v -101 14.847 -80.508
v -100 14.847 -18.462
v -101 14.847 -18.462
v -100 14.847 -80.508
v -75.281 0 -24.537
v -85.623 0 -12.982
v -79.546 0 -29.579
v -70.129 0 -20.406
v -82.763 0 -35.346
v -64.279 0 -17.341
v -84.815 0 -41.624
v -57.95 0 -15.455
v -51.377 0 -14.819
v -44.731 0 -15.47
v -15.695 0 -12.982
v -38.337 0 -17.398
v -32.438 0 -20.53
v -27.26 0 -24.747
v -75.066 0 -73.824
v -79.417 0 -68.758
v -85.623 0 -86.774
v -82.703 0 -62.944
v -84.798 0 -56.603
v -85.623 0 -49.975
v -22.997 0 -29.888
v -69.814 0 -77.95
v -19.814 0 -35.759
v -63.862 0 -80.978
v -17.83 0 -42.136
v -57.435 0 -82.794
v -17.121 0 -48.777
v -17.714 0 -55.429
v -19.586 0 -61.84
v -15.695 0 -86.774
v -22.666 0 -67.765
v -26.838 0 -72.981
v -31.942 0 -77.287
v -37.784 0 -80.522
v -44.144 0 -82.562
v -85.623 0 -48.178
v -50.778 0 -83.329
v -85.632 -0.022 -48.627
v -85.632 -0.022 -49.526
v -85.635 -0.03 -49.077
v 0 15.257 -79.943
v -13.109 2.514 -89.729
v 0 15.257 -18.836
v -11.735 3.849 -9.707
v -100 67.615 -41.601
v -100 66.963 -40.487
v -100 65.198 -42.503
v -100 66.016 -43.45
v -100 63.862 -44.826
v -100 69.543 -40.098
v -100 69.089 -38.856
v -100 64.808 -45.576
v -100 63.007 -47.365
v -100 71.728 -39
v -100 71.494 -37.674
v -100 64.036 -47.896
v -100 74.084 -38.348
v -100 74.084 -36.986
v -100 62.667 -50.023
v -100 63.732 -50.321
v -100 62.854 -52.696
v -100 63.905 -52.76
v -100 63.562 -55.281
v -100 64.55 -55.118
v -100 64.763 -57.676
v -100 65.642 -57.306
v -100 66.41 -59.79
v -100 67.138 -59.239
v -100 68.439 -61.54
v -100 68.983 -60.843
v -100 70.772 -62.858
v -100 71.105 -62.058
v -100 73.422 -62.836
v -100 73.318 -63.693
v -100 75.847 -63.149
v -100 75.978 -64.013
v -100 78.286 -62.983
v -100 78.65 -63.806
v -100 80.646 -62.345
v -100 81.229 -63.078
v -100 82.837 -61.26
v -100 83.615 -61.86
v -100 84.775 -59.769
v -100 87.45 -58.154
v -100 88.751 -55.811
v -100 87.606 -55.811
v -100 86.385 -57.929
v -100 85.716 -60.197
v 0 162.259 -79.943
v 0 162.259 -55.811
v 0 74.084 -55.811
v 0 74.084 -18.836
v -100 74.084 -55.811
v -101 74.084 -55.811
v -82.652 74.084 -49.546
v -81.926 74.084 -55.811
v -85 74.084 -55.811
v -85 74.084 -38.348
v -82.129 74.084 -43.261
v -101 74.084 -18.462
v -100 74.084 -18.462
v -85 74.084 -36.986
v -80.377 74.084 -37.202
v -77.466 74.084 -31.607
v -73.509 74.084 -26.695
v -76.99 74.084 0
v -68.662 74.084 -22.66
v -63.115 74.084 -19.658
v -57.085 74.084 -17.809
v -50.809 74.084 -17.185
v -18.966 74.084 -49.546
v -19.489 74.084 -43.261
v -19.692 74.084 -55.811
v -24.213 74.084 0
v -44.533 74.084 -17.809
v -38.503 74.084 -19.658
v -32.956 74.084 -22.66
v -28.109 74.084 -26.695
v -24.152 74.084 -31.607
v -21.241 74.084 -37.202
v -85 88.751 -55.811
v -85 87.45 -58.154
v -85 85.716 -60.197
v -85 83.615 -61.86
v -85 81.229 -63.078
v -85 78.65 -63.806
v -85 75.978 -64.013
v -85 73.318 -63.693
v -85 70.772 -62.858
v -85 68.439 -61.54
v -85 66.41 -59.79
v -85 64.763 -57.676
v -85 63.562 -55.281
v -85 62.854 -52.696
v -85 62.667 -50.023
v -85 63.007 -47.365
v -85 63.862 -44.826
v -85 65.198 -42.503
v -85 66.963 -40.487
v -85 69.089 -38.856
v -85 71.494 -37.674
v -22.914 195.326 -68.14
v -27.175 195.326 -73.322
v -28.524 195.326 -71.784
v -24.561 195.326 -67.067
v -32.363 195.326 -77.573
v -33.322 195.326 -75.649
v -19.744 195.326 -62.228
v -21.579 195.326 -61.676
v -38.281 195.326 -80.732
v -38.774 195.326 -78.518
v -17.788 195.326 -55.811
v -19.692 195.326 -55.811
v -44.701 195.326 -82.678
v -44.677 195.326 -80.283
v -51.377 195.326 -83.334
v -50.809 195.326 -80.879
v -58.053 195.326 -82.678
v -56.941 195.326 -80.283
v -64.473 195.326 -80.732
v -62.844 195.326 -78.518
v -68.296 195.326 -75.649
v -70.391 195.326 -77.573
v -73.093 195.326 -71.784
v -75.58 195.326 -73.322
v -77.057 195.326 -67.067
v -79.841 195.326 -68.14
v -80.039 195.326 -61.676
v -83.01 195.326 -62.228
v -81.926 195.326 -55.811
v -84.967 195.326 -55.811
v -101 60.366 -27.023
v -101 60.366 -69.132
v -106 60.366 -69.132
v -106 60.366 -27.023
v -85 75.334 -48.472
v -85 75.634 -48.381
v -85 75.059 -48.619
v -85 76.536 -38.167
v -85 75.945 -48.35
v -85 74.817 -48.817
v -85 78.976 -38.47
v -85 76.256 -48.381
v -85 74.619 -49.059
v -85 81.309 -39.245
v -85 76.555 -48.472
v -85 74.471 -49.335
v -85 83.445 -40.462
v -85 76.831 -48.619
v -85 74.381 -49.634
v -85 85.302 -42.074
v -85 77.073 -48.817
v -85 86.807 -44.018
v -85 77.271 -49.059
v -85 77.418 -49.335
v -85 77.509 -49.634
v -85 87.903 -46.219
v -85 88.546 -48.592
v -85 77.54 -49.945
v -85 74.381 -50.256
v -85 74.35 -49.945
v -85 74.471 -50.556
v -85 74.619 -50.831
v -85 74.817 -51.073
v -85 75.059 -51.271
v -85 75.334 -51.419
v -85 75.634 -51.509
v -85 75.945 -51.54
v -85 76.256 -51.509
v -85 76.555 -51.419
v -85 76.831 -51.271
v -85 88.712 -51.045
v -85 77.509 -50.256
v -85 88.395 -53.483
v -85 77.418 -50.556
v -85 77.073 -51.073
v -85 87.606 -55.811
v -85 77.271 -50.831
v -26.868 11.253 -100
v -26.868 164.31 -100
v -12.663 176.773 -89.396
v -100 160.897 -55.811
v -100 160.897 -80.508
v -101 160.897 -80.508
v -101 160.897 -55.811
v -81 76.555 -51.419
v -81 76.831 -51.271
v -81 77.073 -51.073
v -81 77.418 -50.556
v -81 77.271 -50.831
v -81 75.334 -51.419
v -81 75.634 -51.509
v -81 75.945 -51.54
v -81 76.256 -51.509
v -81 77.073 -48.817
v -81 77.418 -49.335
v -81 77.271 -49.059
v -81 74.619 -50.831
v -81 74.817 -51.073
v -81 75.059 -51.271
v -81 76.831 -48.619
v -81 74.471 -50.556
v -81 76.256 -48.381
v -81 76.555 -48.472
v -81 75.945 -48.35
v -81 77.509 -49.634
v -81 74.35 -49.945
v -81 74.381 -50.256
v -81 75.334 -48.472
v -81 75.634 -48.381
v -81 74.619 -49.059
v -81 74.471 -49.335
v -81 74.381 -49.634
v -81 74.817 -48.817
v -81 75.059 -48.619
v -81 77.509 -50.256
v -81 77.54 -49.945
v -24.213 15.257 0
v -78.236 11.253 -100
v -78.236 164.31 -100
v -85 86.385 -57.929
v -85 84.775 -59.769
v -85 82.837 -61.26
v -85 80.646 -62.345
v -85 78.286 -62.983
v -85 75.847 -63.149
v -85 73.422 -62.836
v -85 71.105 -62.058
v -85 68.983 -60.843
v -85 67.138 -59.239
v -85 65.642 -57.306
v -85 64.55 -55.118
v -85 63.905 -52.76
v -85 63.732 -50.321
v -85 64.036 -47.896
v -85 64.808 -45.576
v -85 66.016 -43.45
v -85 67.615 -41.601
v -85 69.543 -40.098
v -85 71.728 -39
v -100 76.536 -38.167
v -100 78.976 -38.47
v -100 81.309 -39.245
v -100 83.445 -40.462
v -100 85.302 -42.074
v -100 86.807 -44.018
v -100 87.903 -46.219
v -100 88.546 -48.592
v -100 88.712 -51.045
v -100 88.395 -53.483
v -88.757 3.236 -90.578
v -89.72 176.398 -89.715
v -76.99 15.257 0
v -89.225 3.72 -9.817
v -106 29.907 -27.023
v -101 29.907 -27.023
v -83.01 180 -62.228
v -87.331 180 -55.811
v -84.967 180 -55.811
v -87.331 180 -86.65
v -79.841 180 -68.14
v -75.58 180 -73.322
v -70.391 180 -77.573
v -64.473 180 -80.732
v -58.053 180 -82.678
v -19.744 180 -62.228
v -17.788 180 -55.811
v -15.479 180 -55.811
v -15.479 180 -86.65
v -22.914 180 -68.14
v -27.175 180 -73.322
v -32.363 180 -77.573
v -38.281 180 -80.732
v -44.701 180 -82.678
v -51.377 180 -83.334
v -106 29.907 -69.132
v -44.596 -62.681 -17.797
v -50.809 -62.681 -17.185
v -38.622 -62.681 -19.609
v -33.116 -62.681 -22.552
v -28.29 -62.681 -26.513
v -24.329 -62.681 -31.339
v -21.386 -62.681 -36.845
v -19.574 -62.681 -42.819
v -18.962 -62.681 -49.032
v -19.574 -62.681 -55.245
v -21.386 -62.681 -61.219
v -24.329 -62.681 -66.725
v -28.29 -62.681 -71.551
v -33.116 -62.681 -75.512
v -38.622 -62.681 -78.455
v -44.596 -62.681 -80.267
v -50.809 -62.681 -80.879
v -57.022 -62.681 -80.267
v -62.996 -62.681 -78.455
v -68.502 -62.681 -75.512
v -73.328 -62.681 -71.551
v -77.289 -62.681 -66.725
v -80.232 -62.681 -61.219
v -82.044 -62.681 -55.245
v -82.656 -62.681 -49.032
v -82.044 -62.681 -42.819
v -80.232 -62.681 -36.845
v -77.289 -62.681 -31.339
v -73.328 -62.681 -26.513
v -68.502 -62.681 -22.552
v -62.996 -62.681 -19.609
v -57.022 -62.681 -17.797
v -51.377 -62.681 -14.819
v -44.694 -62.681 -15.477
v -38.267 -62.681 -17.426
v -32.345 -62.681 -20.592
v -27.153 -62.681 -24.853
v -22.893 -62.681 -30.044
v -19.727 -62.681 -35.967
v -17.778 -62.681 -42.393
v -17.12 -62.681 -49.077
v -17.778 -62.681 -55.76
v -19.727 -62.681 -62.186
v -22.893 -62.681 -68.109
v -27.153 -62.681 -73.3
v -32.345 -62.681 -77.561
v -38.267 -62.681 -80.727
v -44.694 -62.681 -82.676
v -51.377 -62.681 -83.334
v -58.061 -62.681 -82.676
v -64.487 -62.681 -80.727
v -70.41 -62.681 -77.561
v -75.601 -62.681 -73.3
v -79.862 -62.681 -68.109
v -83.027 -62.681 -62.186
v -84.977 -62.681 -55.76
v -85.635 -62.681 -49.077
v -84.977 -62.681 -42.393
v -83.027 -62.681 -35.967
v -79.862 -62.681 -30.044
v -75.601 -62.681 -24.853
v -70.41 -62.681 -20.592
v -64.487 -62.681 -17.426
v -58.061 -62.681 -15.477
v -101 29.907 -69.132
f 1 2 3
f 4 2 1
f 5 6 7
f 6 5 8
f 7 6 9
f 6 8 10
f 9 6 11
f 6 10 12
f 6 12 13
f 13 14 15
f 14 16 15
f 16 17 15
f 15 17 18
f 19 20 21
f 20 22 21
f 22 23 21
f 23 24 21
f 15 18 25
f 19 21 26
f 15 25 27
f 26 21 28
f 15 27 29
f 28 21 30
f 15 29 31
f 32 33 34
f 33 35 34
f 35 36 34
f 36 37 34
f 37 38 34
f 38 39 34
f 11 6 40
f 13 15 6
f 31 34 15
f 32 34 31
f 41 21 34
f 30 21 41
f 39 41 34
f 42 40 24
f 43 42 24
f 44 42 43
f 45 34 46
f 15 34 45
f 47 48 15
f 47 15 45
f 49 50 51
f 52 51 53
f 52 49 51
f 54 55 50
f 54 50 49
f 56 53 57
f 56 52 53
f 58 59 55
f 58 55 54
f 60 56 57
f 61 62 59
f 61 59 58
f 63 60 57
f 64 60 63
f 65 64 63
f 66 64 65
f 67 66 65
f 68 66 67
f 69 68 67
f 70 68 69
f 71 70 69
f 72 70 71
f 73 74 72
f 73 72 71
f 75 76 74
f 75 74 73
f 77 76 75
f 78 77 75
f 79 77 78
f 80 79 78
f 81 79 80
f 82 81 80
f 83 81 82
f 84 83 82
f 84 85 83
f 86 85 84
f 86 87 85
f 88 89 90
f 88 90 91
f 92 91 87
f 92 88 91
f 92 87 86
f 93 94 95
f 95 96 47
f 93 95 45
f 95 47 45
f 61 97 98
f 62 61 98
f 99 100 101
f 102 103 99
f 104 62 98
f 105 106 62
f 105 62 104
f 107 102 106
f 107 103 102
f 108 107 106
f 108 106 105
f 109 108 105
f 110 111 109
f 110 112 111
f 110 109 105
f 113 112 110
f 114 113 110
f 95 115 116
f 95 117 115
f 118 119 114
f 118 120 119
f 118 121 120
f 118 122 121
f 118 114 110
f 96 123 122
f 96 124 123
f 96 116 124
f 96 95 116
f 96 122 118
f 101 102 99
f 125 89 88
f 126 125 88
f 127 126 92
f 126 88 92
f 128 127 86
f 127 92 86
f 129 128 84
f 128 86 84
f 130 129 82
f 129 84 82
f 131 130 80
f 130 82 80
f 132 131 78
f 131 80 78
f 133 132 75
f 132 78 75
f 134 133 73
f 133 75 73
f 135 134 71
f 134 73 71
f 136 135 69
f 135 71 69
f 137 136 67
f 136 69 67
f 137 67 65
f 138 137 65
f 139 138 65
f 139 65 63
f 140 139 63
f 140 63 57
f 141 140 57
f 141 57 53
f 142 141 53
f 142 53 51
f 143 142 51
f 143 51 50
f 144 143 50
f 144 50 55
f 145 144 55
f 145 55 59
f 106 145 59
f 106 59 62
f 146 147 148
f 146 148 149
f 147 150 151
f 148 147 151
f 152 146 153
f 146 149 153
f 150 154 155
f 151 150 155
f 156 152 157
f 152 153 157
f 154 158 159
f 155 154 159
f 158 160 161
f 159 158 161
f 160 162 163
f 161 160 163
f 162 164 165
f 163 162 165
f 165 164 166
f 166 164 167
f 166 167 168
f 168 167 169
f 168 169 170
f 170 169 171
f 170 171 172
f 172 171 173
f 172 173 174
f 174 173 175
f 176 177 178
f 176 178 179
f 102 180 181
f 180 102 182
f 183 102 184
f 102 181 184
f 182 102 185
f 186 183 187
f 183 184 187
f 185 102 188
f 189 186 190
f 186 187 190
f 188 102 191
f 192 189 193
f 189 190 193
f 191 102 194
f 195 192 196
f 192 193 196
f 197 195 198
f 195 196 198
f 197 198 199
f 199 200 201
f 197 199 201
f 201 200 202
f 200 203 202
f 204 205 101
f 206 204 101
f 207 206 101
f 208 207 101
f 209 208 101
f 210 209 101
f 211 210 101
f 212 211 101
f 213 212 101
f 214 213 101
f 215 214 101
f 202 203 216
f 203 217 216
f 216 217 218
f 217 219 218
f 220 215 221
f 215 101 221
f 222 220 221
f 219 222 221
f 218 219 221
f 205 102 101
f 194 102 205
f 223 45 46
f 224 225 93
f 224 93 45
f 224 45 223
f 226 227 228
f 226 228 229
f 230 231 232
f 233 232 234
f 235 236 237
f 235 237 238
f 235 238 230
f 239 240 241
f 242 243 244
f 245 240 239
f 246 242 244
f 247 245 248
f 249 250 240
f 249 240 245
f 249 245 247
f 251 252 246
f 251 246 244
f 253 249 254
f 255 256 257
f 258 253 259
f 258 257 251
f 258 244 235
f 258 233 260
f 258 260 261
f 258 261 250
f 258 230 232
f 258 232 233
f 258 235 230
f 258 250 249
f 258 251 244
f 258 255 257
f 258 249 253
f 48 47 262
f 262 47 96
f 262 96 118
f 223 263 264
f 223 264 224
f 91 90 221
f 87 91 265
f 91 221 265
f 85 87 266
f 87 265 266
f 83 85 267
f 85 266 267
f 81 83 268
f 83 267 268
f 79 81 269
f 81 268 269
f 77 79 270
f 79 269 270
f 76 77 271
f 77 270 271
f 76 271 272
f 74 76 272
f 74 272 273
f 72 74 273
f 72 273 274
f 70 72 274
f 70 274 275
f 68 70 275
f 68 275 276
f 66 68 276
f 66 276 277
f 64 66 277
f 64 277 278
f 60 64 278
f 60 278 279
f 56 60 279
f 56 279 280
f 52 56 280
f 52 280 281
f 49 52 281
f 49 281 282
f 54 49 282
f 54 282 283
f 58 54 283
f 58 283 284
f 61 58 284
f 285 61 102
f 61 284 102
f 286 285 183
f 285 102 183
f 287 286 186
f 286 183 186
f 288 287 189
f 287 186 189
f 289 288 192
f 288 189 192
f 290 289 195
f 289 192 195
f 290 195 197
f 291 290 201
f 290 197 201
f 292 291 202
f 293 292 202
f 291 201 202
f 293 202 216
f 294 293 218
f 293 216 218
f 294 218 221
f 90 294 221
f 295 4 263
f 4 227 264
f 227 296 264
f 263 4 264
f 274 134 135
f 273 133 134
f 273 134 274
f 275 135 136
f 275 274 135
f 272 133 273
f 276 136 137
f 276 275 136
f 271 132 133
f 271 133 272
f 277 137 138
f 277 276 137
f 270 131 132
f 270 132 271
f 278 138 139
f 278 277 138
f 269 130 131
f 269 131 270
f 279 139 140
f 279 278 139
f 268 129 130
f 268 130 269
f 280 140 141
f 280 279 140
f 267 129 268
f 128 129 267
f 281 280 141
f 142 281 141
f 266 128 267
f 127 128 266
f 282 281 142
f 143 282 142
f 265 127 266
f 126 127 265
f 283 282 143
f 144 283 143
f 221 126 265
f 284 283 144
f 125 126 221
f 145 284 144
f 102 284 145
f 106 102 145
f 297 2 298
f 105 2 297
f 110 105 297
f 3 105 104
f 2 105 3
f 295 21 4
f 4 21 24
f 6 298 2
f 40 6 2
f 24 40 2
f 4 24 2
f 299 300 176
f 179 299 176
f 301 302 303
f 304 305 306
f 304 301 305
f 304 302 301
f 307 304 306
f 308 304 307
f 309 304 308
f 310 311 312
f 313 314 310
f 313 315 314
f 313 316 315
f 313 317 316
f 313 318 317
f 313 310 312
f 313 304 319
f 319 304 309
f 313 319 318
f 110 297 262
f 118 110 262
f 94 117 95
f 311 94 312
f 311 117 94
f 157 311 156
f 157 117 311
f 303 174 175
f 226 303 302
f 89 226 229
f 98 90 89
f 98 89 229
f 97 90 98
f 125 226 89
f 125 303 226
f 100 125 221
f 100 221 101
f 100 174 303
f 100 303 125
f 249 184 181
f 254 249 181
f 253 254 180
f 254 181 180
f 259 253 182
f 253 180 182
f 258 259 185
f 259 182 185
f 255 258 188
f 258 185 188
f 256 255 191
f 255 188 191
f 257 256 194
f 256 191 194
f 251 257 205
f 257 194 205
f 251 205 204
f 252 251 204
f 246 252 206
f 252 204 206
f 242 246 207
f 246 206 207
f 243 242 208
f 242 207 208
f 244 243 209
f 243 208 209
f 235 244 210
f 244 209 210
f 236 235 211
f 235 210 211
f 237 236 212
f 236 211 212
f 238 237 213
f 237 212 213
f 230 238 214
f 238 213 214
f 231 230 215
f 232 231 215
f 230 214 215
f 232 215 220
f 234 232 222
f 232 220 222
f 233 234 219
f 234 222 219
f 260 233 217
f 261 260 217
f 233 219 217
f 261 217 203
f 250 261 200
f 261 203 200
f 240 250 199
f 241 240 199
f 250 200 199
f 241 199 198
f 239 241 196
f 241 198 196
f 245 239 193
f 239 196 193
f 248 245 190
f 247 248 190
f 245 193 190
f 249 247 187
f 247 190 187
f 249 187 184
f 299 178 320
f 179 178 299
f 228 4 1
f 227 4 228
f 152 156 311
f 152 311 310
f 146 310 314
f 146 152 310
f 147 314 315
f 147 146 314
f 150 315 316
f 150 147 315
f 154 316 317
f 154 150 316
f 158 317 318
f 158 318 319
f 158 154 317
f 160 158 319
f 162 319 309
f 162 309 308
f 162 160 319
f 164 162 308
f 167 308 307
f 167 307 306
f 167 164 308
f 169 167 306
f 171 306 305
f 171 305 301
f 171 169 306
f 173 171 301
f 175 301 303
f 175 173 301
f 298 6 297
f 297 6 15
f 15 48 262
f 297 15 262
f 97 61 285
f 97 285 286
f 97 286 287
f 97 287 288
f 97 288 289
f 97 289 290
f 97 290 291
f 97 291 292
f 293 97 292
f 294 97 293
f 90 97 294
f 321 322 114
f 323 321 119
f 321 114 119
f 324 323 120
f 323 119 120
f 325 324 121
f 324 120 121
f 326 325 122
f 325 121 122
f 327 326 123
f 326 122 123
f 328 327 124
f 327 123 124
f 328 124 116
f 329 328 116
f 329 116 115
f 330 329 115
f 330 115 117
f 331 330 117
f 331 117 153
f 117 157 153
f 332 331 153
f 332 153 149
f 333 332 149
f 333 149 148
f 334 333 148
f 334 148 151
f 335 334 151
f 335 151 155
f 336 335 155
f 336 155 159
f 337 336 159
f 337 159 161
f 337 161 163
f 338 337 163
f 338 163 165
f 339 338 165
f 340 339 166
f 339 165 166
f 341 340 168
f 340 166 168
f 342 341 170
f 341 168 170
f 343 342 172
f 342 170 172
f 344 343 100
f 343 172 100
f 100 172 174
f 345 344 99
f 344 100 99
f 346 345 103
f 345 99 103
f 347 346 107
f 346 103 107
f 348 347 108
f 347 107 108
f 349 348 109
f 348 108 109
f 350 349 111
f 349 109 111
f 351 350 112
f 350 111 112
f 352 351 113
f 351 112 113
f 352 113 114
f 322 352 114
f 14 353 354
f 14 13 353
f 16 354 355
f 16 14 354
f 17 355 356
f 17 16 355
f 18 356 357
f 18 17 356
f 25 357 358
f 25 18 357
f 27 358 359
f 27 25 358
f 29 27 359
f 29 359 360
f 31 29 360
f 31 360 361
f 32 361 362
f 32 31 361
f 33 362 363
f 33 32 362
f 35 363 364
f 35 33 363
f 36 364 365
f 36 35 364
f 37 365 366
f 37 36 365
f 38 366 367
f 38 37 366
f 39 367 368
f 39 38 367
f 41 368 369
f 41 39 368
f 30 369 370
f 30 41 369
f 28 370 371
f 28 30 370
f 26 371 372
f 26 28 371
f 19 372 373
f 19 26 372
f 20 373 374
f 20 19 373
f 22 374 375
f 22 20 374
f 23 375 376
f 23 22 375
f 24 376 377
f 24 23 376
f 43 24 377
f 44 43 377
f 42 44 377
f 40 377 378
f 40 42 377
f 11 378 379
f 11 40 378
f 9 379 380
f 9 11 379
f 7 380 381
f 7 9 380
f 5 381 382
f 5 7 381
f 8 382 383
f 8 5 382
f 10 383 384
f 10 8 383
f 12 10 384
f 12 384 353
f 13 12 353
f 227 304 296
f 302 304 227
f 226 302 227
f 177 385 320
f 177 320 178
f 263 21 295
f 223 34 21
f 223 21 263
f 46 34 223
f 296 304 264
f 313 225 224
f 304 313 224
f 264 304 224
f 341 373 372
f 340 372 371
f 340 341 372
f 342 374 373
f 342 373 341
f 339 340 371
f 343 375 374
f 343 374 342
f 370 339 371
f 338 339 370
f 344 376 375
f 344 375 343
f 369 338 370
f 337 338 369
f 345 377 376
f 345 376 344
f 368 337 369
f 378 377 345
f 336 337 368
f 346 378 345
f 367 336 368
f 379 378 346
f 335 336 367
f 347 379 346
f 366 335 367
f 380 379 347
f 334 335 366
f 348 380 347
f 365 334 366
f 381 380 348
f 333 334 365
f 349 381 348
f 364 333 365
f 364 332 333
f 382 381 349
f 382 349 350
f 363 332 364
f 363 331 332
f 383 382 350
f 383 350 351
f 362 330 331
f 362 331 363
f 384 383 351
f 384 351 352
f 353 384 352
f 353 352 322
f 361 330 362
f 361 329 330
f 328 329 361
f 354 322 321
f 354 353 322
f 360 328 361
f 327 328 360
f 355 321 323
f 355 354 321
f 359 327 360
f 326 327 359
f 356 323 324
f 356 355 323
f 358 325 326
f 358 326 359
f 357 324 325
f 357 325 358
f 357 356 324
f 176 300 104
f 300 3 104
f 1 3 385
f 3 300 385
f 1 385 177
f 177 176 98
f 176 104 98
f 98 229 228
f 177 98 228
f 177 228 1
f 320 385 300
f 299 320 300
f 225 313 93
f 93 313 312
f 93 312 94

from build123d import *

# Parameters (mm, degrees)
SKETCH1_W           = 100
SKETCH1_H           = 100
BOSS_EXTRUDE1_DEPTH = 180
SKETCH2_R           = 34.257790197
BOSS_EXTRUDE2_DEPTH = 350
SKETCH3_W           = 152.006357392
SKETCH3_H           = 282.452416457
CUT_EXTRUDE2_DEPTH  = 400
CUT_EXTRUDE3_DEPTH  = 400
CUT_EXTRUDE4_DEPTH  = 400
CUT_EXTRUDE5_DEPTH  = 400
SKETCH7_W           = 160.159381639
SKETCH7_H           = 147.362276113
CUT_EXTRUDE6_DEPTH  = 400
SKETCH8_W           = 147.310744502
SKETCH8_H           = 162.038906966
CUT_EXTRUDE7_DEPTH  = 400
SKETCH9_R           = 31.847293423
CUT_EXTRUDE8_DEPTH  = 400
SKETCH10_W          = 140.220962397
SKETCH10_H          = 212.033531124
CUT_EXTRUDE9_DEPTH  = 400
SKETCH11_R          = 13.603137886
CUT_EXTRUDE11_DEPTH = 15
SKETCH12_R          = 12.495422516
BOSS_EXTRUDE3_DEPTH = 15
SKETCH13_R          = 1.594865099
BOSS_EXTRUDE4_DEPTH = 4
SKETCH14_W          = 100.74862993
SKETCH14_H          = 110.555003588
CUT_EXTRUDE13_DEPTH = 400
BOSS_EXTRUDE5_DEPTH = 1
SKETCH16_W          = 42.108585165
SKETCH16_H          = 30.458347221
BOSS_EXTRUDE6_DEPTH = 5


with BuildPart() as part:
    # Sketch1 → Boss-Extrude1 (new body)
    with BuildSketch(Plane(origin=(0, 0, 0), x_dir=(1, 0, 0), z_dir=(0, 1, 0))):
        with Locations((-50, 50)):
            Rectangle(SKETCH1_W, SKETCH1_H)
    extrude(amount=BOSS_EXTRUDE1_DEPTH)

    # Sketch2 → Boss-Extrude2 (add, symmetric)
    with BuildSketch(Plane(origin=(0, 180, 0), x_dir=(1, 0, 0), z_dir=(0, 1, 0))):
        with Locations(Location((-51.377291833, 49.076536384, 0), (0, 0, 270))):
            Circle(SKETCH2_R)
    extrude(amount=BOSS_EXTRUDE2_DEPTH, both=True)

    # Sketch3 → Cut-Extrude2 (cut)
    with BuildSketch(Plane(origin=(0, 0, 0), x_dir=(0, 0, -1), z_dir=(1, 0, 0))):
        with Locations((57.419900112, 502.274302507)):
            Rectangle(SKETCH3_W, SKETCH3_H)
    extrude(amount=-CUT_EXTRUDE2_DEPTH, mode=Mode.SUBTRACT)

    # Sketch4 → Cut-Extrude3 (cut)
    with BuildSketch(Plane(origin=(0, 0, 0), x_dir=(0, 0, -1), z_dir=(1, 0, 0))):
        Polygon((12.981970869, 0), (-8.994244796, 25.828096003), (-18.564506014, -15.259465835), align=None)
        Polygon((85.072517936, -1.448103984), (109.237639161, 19.113145112), (115.920034239, -3.267382694), align=None)
        Polygon((12.981970869, 180), (-8.994244796, 148.537596011), (-15.418178585, 193.219274892), align=None)
        Polygon((85.072517936, 181.854312784), (103.841225373, 159.795920888), (106.132549481, 198.647393934), align=None)
    extrude(amount=-CUT_EXTRUDE3_DEPTH, mode=Mode.SUBTRACT)

    # Sketch5 → Cut-Extrude4 (cut)
    with BuildSketch(Plane.XY):
        Polygon((-85.623287335, 0), (-106.370377984, 21.426392531), (-122.288861874, 3.209259887), (-93.526345261, -19.884701759), align=None)
        Polygon((-15.694988751, 0), (0, 15.257385304), (12.122677088, 15.257385304), (10.563067769, -19.884701759), align=None)
        Polygon((-87.166490339, 180.248071029), (-106.370377984, 151.29108453), (-117.705469457, 200.501115102), align=None)
        Polygon((-15.694988751, 180.248071029), (7.833767065, 153.279557508), (0, 193.941208308), align=None)
    extrude(amount=-CUT_EXTRUDE4_DEPTH, mode=Mode.SUBTRACT)

    # Sketch6 → Cut-Extrude5 (cut)
    with BuildSketch(Plane(origin=(0, 180, 0), x_dir=(1, 0, 0), z_dir=(0, 1, 0))):
        Polygon((-112.386997555, 28.400400964), (-64.261264503, -10.212759359), (-84.406366528, -15.51192827), (-124.649689542, -15.51192827), align=None)
        Polygon((-97.065537028, 135.861756084), (-119.37552445, 77.792688888), (-118.043343626, 64.347606737), (-66.428694172, 110.575168787), align=None)
        Polygon((-24.69640689, -21.815840769), (11.092108798, -8.97361337), (17.428316417, 32.393768119), (-38.531576846, -11.139157378), align=None)
        Polygon((-17.445484601, 140.804394854), (35.417473102, 107.262520599), (9.305452855, 72.996438725), (-31.724385352, 103.625272537), align=None)
    extrude(amount=-CUT_EXTRUDE5_DEPTH, mode=Mode.SUBTRACT)

    # Sketch7 → Cut-Extrude6 (cut)
    with BuildSketch(Plane.XY):
        with Locations((-66.123258915, -136.36252694)):
            Rectangle(SKETCH7_W, SKETCH7_H)
    extrude(amount=-CUT_EXTRUDE6_DEPTH, mode=Mode.SUBTRACT)

    # Sketch8 → Cut-Extrude7 (cut)
    with BuildSketch(Plane.XY):
        with Locations((-53.541153336, 332.448287589)):
            Rectangle(SKETCH8_W, SKETCH8_H)
    extrude(amount=-CUT_EXTRUDE7_DEPTH, mode=Mode.SUBTRACT)

    # Sketch9 → Cut-Extrude8 (cut)
    with BuildSketch(Plane(origin=(0, 251.428834106, 0), x_dir=(1, 0, 0), z_dir=(0, 1, 0))):
        with Locations(Location((-50.808993157, 49.032036374, 0), (0, 0, 270))):
            Circle(SKETCH9_R)
    extrude(amount=-CUT_EXTRUDE8_DEPTH, mode=Mode.SUBTRACT)

    # Sketch10 → Cut-Extrude9 (cut)
    with BuildSketch(Plane.ZY.offset(100)):
        with Locations((14.299084536, 180.100625535)):
            Rectangle(SKETCH10_W, SKETCH10_H)
    extrude(amount=-CUT_EXTRUDE9_DEPTH, mode=Mode.SUBTRACT)

    # Sketch11 → Cut-Extrude11 (cut)
    with BuildSketch(Plane.ZY.offset(100)):
        with Locations((-50.413251954, 76.264646142)):
            Circle(SKETCH11_R)
    extrude(amount=-CUT_EXTRUDE11_DEPTH, mode=Mode.SUBTRACT)

    # Sketch12 → Boss-Extrude3 (add)
    with BuildSketch(Plane.ZY.offset(85)):
        with Locations(Location((-50.658800768, 76.222522328, 0), (0, 0, 114.353089558))):
            Circle(SKETCH12_R)
    extrude(amount=BOSS_EXTRUDE3_DEPTH)

    # Sketch13 → Boss-Extrude4 (add)
    with BuildSketch(Plane(origin=(-85, 0, 0), x_dir=(0, 0, -1), z_dir=(1, 0, 0))):
        with Locations(Location((49.945205578, 75.944780088, 0), (0, 0, 180))):
            Circle(SKETCH13_R)
    extrude(amount=BOSS_EXTRUDE4_DEPTH)

    # Sketch14 → Cut-Extrude13 (cut)
    with BuildSketch(Plane.ZY.offset(100)):
        with Locations((-65.350029467, 250.603414818)):
            Rectangle(SKETCH14_W, SKETCH14_H)
    extrude(amount=-CUT_EXTRUDE13_DEPTH, mode=Mode.SUBTRACT)

    # Sketch15 → Boss-Extrude5 (add)
    with BuildSketch(Plane.ZY.offset(100)):
        Polygon((-18.461827727, 14.847435435), (-80.507743362, 14.847435435), (-80.507743362, 160.896793159), (-55.811396663, 160.896793159), (-55.811396663, 74.083859973), (-18.461827727, 74.083859973), align=None)
    extrude(amount=BOSS_EXTRUDE5_DEPTH)

    # Sketch16 → Boss-Extrude6 (add)
    with BuildSketch(Plane.ZY.offset(101)):
        with Locations((-48.07732297, 45.136437142)):
            Rectangle(SKETCH16_W, SKETCH16_H)
    extrude(amount=BOSS_EXTRUDE6_DEPTH)


solid = part.part
